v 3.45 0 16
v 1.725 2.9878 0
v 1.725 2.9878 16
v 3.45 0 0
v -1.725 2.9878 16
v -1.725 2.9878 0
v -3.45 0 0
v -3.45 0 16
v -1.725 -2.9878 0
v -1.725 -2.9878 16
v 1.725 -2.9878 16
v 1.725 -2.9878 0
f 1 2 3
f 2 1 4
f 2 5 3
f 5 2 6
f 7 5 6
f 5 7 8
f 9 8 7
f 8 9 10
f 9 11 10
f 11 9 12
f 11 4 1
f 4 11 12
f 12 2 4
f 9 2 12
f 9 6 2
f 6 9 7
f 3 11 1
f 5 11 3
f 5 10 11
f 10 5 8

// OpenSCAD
hex_dia = 6.9;

//circle(r=hex_dia);
cylinder(d=hex_dia, h=16.0, $fn=6);
